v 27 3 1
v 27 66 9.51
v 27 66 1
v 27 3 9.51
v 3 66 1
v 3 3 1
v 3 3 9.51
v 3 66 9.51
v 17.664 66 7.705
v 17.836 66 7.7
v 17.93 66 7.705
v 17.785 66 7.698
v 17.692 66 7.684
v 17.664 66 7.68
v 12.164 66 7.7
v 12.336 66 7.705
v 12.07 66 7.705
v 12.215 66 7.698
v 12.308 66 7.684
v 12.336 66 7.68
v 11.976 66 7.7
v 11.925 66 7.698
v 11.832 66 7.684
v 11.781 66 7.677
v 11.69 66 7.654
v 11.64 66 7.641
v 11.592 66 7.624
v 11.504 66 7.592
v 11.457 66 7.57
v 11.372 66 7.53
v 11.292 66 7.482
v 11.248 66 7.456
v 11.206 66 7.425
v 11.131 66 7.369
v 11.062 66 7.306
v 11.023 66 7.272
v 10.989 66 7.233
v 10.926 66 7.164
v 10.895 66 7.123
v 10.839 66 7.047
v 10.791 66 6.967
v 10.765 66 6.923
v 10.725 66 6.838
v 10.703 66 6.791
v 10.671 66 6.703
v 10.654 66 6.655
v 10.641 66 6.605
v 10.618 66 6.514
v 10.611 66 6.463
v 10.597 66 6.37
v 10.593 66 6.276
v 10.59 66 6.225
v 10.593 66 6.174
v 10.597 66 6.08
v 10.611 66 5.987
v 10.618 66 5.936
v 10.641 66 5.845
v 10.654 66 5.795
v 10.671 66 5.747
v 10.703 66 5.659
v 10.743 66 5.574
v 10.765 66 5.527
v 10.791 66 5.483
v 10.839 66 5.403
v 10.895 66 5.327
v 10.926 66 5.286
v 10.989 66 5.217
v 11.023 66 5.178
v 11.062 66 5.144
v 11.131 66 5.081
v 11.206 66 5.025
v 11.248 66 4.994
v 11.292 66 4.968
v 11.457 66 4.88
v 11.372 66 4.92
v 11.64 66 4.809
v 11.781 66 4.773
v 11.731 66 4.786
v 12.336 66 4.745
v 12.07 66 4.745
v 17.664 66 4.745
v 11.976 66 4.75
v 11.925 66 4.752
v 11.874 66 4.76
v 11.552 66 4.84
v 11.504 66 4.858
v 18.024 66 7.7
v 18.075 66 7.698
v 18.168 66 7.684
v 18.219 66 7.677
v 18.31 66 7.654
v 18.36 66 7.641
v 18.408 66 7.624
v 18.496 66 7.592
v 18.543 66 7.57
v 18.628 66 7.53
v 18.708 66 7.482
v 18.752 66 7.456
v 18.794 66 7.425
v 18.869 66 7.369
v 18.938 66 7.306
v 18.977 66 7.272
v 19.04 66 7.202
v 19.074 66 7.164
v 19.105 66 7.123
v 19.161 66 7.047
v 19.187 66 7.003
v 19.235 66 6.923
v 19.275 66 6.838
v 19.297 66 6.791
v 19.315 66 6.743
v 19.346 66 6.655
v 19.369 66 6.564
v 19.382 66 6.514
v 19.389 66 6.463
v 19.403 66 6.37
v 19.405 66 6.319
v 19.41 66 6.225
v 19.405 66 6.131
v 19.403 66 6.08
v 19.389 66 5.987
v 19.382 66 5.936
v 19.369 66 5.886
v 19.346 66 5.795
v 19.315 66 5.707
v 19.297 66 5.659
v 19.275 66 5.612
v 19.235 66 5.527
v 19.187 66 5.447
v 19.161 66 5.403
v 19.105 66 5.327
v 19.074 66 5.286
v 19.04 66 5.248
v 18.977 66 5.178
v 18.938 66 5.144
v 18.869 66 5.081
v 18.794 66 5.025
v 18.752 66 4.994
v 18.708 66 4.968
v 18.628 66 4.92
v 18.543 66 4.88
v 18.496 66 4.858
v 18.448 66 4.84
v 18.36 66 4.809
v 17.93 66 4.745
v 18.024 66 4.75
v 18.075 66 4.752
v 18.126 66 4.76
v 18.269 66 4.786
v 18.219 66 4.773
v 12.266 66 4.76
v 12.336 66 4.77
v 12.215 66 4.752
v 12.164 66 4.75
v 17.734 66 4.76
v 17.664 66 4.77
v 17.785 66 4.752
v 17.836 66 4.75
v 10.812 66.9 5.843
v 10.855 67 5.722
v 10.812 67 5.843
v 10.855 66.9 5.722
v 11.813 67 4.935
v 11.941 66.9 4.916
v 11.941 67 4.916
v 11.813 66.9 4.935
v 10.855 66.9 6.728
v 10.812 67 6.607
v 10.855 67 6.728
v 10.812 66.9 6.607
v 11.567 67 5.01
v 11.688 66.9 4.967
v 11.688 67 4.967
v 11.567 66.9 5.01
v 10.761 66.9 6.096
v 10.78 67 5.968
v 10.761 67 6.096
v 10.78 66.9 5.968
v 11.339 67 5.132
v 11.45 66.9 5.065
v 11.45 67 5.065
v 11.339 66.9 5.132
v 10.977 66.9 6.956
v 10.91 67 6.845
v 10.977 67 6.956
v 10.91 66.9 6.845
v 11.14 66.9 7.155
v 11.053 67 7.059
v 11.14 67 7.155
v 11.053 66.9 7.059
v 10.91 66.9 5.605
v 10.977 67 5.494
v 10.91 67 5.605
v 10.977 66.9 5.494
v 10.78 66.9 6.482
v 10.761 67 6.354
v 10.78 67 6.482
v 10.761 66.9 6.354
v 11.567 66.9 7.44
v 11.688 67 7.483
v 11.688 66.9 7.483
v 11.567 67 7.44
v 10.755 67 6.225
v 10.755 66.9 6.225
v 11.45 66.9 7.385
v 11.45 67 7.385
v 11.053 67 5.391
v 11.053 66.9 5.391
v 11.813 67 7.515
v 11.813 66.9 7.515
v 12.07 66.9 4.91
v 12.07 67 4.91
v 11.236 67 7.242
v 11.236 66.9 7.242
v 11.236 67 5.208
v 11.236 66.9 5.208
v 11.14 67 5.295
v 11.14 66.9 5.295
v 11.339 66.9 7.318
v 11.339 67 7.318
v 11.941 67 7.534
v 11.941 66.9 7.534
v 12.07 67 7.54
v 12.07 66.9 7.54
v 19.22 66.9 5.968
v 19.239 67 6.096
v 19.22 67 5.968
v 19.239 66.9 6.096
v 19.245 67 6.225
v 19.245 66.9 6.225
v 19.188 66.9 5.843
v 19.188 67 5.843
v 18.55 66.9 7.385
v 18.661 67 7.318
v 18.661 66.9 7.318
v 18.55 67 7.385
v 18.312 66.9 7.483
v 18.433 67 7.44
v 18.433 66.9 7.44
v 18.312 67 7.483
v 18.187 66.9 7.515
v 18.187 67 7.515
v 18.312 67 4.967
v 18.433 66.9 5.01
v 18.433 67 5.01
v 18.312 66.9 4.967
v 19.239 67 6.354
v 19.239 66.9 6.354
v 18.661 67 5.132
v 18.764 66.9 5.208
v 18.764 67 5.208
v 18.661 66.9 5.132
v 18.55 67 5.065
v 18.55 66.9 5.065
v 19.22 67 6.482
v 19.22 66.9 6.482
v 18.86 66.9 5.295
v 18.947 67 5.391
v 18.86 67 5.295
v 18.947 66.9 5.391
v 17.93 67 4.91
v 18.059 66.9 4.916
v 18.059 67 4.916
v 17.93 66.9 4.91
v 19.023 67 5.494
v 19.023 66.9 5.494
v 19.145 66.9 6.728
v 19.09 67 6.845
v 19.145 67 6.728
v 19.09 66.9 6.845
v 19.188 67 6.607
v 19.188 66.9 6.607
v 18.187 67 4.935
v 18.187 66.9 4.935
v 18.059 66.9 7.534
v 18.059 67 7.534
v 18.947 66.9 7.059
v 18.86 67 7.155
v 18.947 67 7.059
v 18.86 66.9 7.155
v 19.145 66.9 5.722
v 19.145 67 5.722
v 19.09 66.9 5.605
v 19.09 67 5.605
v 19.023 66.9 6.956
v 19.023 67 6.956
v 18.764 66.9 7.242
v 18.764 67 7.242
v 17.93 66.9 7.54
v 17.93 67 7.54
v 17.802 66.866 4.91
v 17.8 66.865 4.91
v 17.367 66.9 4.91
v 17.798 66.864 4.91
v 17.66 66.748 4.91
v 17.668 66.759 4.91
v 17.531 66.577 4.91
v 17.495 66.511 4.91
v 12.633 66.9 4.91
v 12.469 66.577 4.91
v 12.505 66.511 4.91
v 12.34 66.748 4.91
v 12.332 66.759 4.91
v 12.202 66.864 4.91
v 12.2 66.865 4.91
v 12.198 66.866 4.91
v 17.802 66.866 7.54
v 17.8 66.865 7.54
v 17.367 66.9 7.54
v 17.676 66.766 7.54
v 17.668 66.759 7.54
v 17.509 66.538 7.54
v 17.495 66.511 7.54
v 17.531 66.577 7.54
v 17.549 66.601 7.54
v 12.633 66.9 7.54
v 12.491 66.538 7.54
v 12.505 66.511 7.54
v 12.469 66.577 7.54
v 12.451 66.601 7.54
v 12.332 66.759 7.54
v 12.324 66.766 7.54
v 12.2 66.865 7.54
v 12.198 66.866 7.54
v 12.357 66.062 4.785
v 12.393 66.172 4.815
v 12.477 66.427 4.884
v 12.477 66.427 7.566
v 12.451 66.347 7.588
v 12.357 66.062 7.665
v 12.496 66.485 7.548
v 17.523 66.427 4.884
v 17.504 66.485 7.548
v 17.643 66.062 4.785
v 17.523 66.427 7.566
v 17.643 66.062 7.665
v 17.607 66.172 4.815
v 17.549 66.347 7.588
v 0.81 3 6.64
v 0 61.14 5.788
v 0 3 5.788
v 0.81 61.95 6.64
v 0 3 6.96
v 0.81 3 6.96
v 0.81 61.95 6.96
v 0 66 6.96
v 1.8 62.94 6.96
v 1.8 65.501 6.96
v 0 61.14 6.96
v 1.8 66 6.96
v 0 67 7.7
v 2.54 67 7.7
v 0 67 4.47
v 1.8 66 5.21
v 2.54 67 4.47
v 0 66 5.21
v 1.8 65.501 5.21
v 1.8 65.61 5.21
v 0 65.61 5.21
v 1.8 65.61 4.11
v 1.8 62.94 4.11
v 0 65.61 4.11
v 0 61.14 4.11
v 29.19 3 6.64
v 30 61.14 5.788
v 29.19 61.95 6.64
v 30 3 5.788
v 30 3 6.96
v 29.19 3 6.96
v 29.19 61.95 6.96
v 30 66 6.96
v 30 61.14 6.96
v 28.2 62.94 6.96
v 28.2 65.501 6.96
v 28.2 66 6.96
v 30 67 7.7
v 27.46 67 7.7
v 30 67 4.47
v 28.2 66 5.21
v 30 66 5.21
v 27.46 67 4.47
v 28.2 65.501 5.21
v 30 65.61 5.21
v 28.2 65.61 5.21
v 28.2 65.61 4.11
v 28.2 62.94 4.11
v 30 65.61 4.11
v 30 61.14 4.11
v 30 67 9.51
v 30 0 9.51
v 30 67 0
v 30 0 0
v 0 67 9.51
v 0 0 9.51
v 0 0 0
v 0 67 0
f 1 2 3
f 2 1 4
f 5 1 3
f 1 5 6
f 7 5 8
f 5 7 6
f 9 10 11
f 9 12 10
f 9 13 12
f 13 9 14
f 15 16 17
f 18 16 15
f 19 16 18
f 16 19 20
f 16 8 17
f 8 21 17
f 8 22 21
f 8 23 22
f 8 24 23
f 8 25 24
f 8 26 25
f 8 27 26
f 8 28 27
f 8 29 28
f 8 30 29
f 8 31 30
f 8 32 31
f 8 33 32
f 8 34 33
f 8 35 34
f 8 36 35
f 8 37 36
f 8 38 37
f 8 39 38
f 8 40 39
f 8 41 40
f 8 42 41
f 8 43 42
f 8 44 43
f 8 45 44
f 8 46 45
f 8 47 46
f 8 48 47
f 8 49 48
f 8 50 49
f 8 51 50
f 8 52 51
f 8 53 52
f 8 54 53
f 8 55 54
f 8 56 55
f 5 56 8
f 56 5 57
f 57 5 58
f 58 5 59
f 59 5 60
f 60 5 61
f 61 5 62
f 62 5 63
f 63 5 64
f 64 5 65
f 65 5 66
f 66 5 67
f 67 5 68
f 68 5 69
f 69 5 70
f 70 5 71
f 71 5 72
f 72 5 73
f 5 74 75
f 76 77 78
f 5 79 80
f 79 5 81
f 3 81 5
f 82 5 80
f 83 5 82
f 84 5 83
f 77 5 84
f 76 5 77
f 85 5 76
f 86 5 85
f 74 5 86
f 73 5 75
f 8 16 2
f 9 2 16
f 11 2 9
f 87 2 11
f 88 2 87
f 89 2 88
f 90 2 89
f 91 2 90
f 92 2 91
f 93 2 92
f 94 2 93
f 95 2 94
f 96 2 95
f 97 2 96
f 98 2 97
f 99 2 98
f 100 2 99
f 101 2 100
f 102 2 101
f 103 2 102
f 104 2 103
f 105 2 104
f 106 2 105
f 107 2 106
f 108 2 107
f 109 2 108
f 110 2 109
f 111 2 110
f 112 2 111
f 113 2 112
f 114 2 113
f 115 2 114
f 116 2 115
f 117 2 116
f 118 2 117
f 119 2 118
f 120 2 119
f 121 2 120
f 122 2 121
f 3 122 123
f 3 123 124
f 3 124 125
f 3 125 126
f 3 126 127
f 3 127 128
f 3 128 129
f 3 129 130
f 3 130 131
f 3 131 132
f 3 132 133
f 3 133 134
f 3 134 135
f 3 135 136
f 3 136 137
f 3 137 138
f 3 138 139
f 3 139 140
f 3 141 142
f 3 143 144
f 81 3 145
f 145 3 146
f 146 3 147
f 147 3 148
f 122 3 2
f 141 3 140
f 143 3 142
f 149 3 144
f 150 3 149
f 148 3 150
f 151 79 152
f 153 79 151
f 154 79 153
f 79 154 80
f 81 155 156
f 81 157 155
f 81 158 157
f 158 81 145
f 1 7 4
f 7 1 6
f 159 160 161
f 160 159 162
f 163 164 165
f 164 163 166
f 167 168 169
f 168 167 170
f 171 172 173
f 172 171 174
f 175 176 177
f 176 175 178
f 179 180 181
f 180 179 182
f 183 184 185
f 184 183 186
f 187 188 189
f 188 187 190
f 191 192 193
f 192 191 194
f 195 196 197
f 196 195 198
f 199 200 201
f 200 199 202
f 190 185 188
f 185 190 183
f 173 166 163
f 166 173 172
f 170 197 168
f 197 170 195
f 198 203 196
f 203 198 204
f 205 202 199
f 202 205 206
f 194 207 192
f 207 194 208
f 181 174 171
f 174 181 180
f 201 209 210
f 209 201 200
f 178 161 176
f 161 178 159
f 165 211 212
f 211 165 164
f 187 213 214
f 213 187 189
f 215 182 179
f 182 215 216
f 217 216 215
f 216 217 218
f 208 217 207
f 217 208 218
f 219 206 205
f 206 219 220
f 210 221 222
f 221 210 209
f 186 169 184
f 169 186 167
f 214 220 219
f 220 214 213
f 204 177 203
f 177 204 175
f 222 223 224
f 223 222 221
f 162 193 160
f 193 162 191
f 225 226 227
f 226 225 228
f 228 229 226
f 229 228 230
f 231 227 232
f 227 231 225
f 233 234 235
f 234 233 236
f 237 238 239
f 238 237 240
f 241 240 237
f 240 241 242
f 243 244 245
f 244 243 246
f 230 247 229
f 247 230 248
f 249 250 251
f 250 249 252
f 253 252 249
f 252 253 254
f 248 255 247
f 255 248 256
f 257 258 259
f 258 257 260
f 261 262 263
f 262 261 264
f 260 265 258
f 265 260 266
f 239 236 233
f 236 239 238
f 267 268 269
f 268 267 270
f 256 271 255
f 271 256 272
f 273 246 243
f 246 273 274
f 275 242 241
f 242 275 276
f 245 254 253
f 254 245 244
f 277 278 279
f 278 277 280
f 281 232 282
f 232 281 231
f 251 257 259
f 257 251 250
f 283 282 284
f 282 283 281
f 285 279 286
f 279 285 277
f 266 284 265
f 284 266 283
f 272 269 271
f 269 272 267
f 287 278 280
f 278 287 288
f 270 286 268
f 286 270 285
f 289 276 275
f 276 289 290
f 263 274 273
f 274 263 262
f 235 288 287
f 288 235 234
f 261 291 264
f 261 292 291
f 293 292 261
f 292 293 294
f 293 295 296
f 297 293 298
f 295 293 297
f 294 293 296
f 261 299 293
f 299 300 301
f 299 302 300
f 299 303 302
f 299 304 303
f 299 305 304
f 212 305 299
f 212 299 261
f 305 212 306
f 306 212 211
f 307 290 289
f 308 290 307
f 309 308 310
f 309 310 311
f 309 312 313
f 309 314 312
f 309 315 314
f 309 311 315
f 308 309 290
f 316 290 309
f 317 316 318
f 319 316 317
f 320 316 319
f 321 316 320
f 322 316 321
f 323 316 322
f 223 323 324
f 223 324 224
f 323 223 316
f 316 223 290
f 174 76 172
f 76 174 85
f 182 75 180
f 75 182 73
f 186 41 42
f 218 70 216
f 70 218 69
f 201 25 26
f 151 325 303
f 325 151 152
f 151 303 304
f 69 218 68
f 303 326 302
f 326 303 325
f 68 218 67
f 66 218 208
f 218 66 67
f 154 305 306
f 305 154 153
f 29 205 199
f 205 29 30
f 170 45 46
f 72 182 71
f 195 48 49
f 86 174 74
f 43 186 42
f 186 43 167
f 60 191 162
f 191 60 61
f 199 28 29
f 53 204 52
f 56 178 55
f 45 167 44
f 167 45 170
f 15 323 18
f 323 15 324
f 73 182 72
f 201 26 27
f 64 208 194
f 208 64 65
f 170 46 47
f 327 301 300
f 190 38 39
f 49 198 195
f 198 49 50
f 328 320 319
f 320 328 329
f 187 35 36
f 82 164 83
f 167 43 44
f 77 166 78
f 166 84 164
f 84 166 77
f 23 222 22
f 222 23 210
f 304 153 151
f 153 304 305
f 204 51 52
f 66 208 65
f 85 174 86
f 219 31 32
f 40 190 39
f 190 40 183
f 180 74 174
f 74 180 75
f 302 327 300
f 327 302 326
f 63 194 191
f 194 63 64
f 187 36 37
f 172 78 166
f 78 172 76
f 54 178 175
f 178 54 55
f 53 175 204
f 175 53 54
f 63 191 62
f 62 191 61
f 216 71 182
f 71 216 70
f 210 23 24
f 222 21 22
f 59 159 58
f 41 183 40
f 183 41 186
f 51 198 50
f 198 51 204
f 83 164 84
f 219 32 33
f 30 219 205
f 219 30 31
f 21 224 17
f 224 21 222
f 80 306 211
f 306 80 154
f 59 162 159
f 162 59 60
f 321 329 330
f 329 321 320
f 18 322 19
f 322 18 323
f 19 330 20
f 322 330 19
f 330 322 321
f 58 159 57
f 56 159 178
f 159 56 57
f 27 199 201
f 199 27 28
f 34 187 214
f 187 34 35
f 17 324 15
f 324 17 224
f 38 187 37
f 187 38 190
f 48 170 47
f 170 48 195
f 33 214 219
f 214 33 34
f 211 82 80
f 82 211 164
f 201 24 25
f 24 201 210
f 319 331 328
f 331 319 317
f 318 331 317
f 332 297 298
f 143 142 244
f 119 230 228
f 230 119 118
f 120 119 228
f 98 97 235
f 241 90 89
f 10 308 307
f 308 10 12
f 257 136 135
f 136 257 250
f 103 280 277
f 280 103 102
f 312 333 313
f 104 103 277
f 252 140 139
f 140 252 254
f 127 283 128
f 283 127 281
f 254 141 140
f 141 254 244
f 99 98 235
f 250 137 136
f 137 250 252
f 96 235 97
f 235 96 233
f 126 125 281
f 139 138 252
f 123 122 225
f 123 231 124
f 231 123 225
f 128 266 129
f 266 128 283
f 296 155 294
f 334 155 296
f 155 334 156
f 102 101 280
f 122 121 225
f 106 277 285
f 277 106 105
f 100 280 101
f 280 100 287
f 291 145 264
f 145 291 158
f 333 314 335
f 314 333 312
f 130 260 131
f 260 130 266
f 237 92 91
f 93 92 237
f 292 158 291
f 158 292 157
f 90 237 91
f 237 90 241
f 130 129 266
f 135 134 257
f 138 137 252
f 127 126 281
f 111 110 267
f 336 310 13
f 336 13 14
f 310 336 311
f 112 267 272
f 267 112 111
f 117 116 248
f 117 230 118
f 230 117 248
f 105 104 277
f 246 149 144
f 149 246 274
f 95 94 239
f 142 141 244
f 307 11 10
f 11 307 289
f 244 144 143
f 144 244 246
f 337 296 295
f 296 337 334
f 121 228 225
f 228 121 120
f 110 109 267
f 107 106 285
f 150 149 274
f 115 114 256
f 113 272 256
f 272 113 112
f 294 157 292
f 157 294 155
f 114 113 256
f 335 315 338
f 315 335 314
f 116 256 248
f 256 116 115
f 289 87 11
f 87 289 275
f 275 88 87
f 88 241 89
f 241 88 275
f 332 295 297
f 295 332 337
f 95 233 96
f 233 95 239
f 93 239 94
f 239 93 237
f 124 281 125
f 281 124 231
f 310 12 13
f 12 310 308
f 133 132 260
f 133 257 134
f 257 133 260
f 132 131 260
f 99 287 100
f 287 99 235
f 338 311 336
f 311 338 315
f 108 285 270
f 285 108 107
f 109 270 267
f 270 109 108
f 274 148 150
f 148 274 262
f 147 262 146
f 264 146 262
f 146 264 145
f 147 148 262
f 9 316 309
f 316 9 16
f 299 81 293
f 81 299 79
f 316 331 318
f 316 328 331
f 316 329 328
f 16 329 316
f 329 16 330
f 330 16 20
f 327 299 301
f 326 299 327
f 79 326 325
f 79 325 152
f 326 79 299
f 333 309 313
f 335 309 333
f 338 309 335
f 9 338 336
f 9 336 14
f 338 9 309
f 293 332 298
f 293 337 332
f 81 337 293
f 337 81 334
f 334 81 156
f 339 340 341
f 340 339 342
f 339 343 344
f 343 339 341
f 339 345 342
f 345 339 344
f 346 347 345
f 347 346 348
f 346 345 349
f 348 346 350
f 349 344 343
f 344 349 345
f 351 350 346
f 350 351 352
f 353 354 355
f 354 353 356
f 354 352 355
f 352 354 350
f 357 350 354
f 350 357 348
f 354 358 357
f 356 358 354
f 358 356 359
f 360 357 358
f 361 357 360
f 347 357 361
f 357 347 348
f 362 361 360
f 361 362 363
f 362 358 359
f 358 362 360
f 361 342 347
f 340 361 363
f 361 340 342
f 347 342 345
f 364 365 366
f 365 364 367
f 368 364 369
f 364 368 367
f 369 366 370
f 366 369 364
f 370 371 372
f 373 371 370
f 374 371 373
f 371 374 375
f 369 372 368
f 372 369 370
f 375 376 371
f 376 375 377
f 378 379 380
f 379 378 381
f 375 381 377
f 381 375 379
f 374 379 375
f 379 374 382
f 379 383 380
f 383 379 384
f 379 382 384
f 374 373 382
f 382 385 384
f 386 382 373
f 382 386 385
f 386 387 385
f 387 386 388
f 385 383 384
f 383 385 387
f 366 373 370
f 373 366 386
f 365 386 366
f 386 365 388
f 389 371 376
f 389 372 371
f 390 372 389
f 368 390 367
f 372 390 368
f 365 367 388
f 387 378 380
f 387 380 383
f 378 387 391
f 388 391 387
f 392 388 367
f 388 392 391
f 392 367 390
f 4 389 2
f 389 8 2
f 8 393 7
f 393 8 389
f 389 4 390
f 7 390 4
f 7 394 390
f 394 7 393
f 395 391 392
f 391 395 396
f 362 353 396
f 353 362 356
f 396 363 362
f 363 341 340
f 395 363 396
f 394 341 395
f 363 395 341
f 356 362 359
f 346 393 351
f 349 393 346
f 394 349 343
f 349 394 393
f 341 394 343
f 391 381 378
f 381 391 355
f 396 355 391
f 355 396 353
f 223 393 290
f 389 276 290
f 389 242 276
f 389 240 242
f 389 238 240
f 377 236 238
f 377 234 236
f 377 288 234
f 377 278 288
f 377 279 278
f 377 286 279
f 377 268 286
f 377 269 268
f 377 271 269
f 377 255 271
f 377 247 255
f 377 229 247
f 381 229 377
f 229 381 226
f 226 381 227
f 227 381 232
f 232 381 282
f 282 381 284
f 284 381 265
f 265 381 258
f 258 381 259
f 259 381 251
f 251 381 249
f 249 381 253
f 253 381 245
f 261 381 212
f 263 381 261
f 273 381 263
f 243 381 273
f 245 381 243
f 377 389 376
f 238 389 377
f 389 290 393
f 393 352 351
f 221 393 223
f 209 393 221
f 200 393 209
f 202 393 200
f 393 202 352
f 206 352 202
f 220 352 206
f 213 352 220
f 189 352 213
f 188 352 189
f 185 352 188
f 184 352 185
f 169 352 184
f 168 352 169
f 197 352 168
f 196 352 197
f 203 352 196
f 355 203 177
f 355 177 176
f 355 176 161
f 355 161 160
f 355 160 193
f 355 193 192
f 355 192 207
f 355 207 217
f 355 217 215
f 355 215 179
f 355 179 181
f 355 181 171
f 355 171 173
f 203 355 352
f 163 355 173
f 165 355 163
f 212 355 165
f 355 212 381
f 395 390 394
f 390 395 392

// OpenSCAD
// file: ../usb_c_cutout.scad
// The cutout for the USB-C plug
module usb_c_cutout(usb_c_r, usb_c_w, usb_c_h, front_thickness, open_top) {
    length = 10 + front_thickness;

    // The plug is "pushed in" by an extra 0.6 to account for 3d printing tolerances
    translate([-usb_c_w / 2 + usb_c_r, 7 - length + 0.6, usb_c_r])
        rotate([-90, 0, 0])
            union() {
                translate([0, usb_c_r, 0])
                    cylinder(r=usb_c_r, h=length, $fn=64);

                translate([usb_c_w - usb_c_r * 2, usb_c_r, 0])
                    cylinder(r=usb_c_r, h=length, $fn=64);

                cube([usb_c_w - usb_c_r * 2, usb_c_r * 2, length]);

                // Cutout for the pin side of the shell that expands out
                lesser = 7.7;

                translate([0, usb_c_r, 0])
                    cylinder(r2=usb_c_r, r1=3.84 / 2, h=length - lesser, $fn=64);

                translate([usb_c_w - usb_c_r * 2, usb_c_r, 0])
                    cylinder(r2=usb_c_r, r1=3.84 / 2, h=length - lesser, $fn=64);

                translate([usb_c_w / 2 - usb_c_r, usb_c_r, 0])
                    scale([1.8, 1, 1])
                        rotate([0, 0, 45])
                            cylinder(r2=usb_c_r * sqrt(2), r1=3.84 / 2 * sqrt(2), h=length - lesser, $fn=4);

                // If the card drops in from the top rather than sliding in from the front,
                // cut out a slot for the USB-C plug to drop into.
                if (open_top) {
                    translate([-usb_c_r, -10 + usb_c_r, 0])
                        cube([usb_c_w, 10, length]);
                }
            }
}
// file: ../rail.scad
include <anti_z_fighting.scad>

// The rail cutout in the sides of the card
module rail(card, distance_from_end = 0, make_printable = true) {
    rail_depth = 0.81;
    rail_flat_h = 0.32;

    mirror([0, 1, 0]) {

        // The rail that holds the card
        bottom_angle = 43.54;
        difference() {
            start = -anti_z_fighting_value;

            distance_from_end = (distance_from_end > 0) ? distance_from_end : -anti_z_fighting_value;
            end = card[1] - distance_from_end - start;

            // Removing
            union() {
                translate([rail_depth, start, -rail_flat_h])
                    rotate([0, 180 + bottom_angle, 0])
                        cube([2, end, 2]);

                translate([-2 + rail_depth, start, -rail_flat_h])
                    cube([2, end, rail_flat_h]);
            }

            // Re-adding
            translate([-5 + rail_depth, start, 0])
                cube([5, end, 5]);
        }

        pyramid_inset = 1.3 + 0.5;

        // The ramps to make slotting into the latch smooth
        translate([-1.75 / 2 + pyramid_inset, 0, -1.75 / 2]) {
            width_bottom = 3.23;
            width_top = 1.75;
            height = 1.0;

            __ramp_pyramoid(width_bottom, width_top, height);

            width_extra = 0.05 + anti_z_fighting_value;
            height_straight = 1.5; // Large enough to overlap
            translate([-width_extra / 2, height_straight / 2 - anti_z_fighting_value, 0])
                cube([width_top + width_extra, height_straight, width_top], center=true);
        }

        latch_l = 2.67;
        latch_d = pyramid_inset;
        latch_h = 2.85;
        latch_wall = 1.39;

        // The pocket that the latch bar drops into, including a 45 degree cut for printability
        translate([-anti_z_fighting_value, latch_wall, -latch_h])
            cube([latch_d + anti_z_fighting_value, latch_l, latch_h]);

        if (make_printable) {
            translate([latch_d, latch_wall + latch_l, -latch_h])
                rotate([0, 0, -180 + 45])
                    translate([0, -latch_l, 0])
                        cube([latch_d * 2, latch_l, latch_h]);
        }
    }
}

module __ramp_pyramoid(width_bottom, width_top, height) {
    points = [
        // Anti Z-fighting
        [width_bottom / 2, -anti_z_fighting_value, width_bottom / 2],
        [-width_bottom / 2, -anti_z_fighting_value, width_bottom / 2],
        [-width_bottom / 2, -anti_z_fighting_value, -width_bottom / 2],
        [width_bottom / 2, -anti_z_fighting_value, -width_bottom / 2],
        // Front
        [width_bottom / 2, 0, width_bottom / 2],
        [-width_bottom / 2, 0, width_bottom / 2],
        [-width_bottom / 2, 0, -width_bottom / 2],
        [width_bottom / 2, 0, -width_bottom / 2],
        // Rail
        [width_top / 2, height, width_top / 2],
        [-width_bottom / 2, height, width_top / 2], // Stretched
        [-width_bottom / 2, height, -width_top / 2], // Stretched
        [width_top / 2, height, -width_top / 2],
    ];

    faces = [
        [0, 1, 2, 3], // Front
        [11, 10, 9, 8], // Back
        // Perpendicular
        [0, 4, 5, 1], // Top
        [1, 5, 6, 2], // Left
        [2, 6, 7, 3], // Bottom
        [0, 3, 7, 4], // Right
        // Sloped
        [4, 8, 9, 5], // Top
        [5, 9, 10, 6], // Left
        [6, 10, 11, 7], // Bottom
        [4, 7, 11, 8], // Right
    ];

    polyhedron(points=points, faces=faces);
}
// file: ../anti_z_fighting.scad
// https://en.wikipedia.org/wiki/Z-fighting
// Add or subtract this value to prevent Z-fighting on coplanar polygons.
anti_z_fighting_value = 0.001;
// file: ../expansion_card_base.scad
include <anti_z_fighting.scad>

use <rail.scad>
use <usb_c_cutout.scad>

// A basic, printable Expansion Card enclosure
//  open_end - A boolean to make the end of the card that is exposed when inserted open
//  make_printable - Adds ribs to improve printability
module expansion_card_base(base, front_thickness, rear_thickness, bottom_thickness, side_thickness, usb_c_r, usb_c_w, usb_c_h, rail_h, open_end, make_printable) {
    // Hollowing of the inside
    inner = [base[0] - side_thickness * 2, base[1] - front_thickness - rear_thickness, base[2] - bottom_thickness + anti_z_fighting_value];

    difference() {
        cube(base);

        difference() {
            // The main hollow
            translate([side_thickness, open_end ? -anti_z_fighting_value : rear_thickness, bottom_thickness])
                cube([inner[0], open_end ? inner[1] + rear_thickness + anti_z_fighting_value : inner[1], inner[2] + anti_z_fighting_value]);

            // Extra wall thickness where the latch cutouts are
            notch = 1.0;
            notch_offset = 1.5;
            notch_l = 4.5 - front_thickness;
            notch_h = base[2] - 1.5 - bottom_thickness;

            assert(side_thickness >= notch_offset, "There is a gap if the side thickness is smaller than the notch offset!")

            translate([notch_offset, inner[1] + rear_thickness - notch_l, bottom_thickness + notch_h / 2])
                rotate([0, 0, -90])
                    rotate([0, 90, 0])
                        __rib(notch_h, notch);

            translate([notch_offset, inner[1] + rear_thickness - notch_l, bottom_thickness])
                cube([notch, notch_l, notch_h]);

            translate([base[0] - notch_offset, inner[1] + rear_thickness - notch_l, bottom_thickness + notch_h / 2])
                rotate([0, 0, 180])
                    rotate([0, 90, 0])
                        __rib(notch_h, notch);

            translate([base[0] - notch_offset - notch, inner[1] + rear_thickness - notch_l, bottom_thickness])
                cube([notch, notch_l, notch_h]);
        }

        // The USB-C plug cutout
        translate([base[0] / 2, base[1], usb_c_r + usb_c_h])
            usb_c_cutout(usb_c_r, usb_c_w, usb_c_h, front_thickness, false);

        // The sliding rails
        translate([0, base[1], rail_h])
            rail(base, rear_thickness, make_printable);

        translate([base[0], base[1], rail_h])
            mirror([1, 0, 0])
                rail(base, rear_thickness, make_printable);
    }
}

// A simple 45 degree rib to improve printability
module __rib(thickness, height) {
    translate([-thickness / 2, 0, 0])
        difference() {
            cube([thickness, height, height]);

            translate([-thickness / 2, height, 0])
                rotate([45, 0, 0])
                    cube([thickness * 2, height * 2, height * 2]);
        }
}
// file: ../../clearances.scad
module check_clearances(base, front_thickness, rear_thickness, bottom_thickness, side_thickness, usb_c_r, usb_c_w, usb_c_h, rail_h) {
    echo(str("====== Check clearances ======"));

    usb_c_vertical_measurement = 2.41;
    usb_c_horizontal_measurement = 8.28;

    usb_c_vertical_clearance = usb_c_r * 2 - usb_c_vertical_measurement;
    echo(str("USB C hole vertical clearance: ", usb_c_vertical_clearance));
    assert(usb_c_vertical_clearance >= 0);

    usb_c_horizontal_clearance = usb_c_w - usb_c_horizontal_measurement;
    echo(str("USB C hole horizontal clearance: ", usb_c_horizontal_clearance));
    assert(usb_c_horizontal_clearance >= 0);

    board_width_measurement = 23.53;
    board_length_measurement = 11.53 - 6.8 + 40.81 + 17.95;
    board_height_measurement = 1.97 + 2.63 / 2 + 1.05 / 2 + 3.7;

    width_clearance = (base[0] - side_thickness * 2) - board_width_measurement;
    echo(str("Width clearance: ", width_clearance));
    assert(width_clearance >= 0);

    length_clearance = (base[1] - rear_thickness) - board_length_measurement;
    echo(str("Length clearance: ", length_clearance));
    assert(length_clearance >= 0);

    bottom_clearance = (base[2] - bottom_thickness) - board_height_measurement;
    echo(str("Bottom clearance: ", bottom_clearance));
    assert(bottom_clearance >= 0);
}
// main file
use <../../clearances.scad>
use <../expansion_card_base.scad>

length_extra = 32.0 + 3.0; // Rear thickness
bottom_extra = 1.71 + 1.0; // Bottom thickness

// The basic dimensions of an Expansion Card
base = [30.0, 32.0 + length_extra, 6.8 + bottom_extra];

// Wall thicknesses
front_thickness = 1.0;
rear_thickness = 3.0;
bottom_thickness = 1.0;
side_thickness = 3.0;

// Reference height from bottom
reference_height = bottom_extra + 2.2;

// USB-C plug dimensions
usb_c_r = 1.315;
usb_c_w = 5.86 + usb_c_r * 2;
usb_c_h = reference_height + 1.315 - usb_c_r;

// To top of rail
rail_h = reference_height + 2.05;

check_clearances(base, front_thickness, rear_thickness, bottom_thickness, side_thickness, usb_c_r, usb_c_w, usb_c_h, rail_h);

expansion_card_base(base, front_thickness, rear_thickness, bottom_thickness, side_thickness, usb_c_r, usb_c_w, usb_c_h, rail_h, open_end=false, make_printable=true);
